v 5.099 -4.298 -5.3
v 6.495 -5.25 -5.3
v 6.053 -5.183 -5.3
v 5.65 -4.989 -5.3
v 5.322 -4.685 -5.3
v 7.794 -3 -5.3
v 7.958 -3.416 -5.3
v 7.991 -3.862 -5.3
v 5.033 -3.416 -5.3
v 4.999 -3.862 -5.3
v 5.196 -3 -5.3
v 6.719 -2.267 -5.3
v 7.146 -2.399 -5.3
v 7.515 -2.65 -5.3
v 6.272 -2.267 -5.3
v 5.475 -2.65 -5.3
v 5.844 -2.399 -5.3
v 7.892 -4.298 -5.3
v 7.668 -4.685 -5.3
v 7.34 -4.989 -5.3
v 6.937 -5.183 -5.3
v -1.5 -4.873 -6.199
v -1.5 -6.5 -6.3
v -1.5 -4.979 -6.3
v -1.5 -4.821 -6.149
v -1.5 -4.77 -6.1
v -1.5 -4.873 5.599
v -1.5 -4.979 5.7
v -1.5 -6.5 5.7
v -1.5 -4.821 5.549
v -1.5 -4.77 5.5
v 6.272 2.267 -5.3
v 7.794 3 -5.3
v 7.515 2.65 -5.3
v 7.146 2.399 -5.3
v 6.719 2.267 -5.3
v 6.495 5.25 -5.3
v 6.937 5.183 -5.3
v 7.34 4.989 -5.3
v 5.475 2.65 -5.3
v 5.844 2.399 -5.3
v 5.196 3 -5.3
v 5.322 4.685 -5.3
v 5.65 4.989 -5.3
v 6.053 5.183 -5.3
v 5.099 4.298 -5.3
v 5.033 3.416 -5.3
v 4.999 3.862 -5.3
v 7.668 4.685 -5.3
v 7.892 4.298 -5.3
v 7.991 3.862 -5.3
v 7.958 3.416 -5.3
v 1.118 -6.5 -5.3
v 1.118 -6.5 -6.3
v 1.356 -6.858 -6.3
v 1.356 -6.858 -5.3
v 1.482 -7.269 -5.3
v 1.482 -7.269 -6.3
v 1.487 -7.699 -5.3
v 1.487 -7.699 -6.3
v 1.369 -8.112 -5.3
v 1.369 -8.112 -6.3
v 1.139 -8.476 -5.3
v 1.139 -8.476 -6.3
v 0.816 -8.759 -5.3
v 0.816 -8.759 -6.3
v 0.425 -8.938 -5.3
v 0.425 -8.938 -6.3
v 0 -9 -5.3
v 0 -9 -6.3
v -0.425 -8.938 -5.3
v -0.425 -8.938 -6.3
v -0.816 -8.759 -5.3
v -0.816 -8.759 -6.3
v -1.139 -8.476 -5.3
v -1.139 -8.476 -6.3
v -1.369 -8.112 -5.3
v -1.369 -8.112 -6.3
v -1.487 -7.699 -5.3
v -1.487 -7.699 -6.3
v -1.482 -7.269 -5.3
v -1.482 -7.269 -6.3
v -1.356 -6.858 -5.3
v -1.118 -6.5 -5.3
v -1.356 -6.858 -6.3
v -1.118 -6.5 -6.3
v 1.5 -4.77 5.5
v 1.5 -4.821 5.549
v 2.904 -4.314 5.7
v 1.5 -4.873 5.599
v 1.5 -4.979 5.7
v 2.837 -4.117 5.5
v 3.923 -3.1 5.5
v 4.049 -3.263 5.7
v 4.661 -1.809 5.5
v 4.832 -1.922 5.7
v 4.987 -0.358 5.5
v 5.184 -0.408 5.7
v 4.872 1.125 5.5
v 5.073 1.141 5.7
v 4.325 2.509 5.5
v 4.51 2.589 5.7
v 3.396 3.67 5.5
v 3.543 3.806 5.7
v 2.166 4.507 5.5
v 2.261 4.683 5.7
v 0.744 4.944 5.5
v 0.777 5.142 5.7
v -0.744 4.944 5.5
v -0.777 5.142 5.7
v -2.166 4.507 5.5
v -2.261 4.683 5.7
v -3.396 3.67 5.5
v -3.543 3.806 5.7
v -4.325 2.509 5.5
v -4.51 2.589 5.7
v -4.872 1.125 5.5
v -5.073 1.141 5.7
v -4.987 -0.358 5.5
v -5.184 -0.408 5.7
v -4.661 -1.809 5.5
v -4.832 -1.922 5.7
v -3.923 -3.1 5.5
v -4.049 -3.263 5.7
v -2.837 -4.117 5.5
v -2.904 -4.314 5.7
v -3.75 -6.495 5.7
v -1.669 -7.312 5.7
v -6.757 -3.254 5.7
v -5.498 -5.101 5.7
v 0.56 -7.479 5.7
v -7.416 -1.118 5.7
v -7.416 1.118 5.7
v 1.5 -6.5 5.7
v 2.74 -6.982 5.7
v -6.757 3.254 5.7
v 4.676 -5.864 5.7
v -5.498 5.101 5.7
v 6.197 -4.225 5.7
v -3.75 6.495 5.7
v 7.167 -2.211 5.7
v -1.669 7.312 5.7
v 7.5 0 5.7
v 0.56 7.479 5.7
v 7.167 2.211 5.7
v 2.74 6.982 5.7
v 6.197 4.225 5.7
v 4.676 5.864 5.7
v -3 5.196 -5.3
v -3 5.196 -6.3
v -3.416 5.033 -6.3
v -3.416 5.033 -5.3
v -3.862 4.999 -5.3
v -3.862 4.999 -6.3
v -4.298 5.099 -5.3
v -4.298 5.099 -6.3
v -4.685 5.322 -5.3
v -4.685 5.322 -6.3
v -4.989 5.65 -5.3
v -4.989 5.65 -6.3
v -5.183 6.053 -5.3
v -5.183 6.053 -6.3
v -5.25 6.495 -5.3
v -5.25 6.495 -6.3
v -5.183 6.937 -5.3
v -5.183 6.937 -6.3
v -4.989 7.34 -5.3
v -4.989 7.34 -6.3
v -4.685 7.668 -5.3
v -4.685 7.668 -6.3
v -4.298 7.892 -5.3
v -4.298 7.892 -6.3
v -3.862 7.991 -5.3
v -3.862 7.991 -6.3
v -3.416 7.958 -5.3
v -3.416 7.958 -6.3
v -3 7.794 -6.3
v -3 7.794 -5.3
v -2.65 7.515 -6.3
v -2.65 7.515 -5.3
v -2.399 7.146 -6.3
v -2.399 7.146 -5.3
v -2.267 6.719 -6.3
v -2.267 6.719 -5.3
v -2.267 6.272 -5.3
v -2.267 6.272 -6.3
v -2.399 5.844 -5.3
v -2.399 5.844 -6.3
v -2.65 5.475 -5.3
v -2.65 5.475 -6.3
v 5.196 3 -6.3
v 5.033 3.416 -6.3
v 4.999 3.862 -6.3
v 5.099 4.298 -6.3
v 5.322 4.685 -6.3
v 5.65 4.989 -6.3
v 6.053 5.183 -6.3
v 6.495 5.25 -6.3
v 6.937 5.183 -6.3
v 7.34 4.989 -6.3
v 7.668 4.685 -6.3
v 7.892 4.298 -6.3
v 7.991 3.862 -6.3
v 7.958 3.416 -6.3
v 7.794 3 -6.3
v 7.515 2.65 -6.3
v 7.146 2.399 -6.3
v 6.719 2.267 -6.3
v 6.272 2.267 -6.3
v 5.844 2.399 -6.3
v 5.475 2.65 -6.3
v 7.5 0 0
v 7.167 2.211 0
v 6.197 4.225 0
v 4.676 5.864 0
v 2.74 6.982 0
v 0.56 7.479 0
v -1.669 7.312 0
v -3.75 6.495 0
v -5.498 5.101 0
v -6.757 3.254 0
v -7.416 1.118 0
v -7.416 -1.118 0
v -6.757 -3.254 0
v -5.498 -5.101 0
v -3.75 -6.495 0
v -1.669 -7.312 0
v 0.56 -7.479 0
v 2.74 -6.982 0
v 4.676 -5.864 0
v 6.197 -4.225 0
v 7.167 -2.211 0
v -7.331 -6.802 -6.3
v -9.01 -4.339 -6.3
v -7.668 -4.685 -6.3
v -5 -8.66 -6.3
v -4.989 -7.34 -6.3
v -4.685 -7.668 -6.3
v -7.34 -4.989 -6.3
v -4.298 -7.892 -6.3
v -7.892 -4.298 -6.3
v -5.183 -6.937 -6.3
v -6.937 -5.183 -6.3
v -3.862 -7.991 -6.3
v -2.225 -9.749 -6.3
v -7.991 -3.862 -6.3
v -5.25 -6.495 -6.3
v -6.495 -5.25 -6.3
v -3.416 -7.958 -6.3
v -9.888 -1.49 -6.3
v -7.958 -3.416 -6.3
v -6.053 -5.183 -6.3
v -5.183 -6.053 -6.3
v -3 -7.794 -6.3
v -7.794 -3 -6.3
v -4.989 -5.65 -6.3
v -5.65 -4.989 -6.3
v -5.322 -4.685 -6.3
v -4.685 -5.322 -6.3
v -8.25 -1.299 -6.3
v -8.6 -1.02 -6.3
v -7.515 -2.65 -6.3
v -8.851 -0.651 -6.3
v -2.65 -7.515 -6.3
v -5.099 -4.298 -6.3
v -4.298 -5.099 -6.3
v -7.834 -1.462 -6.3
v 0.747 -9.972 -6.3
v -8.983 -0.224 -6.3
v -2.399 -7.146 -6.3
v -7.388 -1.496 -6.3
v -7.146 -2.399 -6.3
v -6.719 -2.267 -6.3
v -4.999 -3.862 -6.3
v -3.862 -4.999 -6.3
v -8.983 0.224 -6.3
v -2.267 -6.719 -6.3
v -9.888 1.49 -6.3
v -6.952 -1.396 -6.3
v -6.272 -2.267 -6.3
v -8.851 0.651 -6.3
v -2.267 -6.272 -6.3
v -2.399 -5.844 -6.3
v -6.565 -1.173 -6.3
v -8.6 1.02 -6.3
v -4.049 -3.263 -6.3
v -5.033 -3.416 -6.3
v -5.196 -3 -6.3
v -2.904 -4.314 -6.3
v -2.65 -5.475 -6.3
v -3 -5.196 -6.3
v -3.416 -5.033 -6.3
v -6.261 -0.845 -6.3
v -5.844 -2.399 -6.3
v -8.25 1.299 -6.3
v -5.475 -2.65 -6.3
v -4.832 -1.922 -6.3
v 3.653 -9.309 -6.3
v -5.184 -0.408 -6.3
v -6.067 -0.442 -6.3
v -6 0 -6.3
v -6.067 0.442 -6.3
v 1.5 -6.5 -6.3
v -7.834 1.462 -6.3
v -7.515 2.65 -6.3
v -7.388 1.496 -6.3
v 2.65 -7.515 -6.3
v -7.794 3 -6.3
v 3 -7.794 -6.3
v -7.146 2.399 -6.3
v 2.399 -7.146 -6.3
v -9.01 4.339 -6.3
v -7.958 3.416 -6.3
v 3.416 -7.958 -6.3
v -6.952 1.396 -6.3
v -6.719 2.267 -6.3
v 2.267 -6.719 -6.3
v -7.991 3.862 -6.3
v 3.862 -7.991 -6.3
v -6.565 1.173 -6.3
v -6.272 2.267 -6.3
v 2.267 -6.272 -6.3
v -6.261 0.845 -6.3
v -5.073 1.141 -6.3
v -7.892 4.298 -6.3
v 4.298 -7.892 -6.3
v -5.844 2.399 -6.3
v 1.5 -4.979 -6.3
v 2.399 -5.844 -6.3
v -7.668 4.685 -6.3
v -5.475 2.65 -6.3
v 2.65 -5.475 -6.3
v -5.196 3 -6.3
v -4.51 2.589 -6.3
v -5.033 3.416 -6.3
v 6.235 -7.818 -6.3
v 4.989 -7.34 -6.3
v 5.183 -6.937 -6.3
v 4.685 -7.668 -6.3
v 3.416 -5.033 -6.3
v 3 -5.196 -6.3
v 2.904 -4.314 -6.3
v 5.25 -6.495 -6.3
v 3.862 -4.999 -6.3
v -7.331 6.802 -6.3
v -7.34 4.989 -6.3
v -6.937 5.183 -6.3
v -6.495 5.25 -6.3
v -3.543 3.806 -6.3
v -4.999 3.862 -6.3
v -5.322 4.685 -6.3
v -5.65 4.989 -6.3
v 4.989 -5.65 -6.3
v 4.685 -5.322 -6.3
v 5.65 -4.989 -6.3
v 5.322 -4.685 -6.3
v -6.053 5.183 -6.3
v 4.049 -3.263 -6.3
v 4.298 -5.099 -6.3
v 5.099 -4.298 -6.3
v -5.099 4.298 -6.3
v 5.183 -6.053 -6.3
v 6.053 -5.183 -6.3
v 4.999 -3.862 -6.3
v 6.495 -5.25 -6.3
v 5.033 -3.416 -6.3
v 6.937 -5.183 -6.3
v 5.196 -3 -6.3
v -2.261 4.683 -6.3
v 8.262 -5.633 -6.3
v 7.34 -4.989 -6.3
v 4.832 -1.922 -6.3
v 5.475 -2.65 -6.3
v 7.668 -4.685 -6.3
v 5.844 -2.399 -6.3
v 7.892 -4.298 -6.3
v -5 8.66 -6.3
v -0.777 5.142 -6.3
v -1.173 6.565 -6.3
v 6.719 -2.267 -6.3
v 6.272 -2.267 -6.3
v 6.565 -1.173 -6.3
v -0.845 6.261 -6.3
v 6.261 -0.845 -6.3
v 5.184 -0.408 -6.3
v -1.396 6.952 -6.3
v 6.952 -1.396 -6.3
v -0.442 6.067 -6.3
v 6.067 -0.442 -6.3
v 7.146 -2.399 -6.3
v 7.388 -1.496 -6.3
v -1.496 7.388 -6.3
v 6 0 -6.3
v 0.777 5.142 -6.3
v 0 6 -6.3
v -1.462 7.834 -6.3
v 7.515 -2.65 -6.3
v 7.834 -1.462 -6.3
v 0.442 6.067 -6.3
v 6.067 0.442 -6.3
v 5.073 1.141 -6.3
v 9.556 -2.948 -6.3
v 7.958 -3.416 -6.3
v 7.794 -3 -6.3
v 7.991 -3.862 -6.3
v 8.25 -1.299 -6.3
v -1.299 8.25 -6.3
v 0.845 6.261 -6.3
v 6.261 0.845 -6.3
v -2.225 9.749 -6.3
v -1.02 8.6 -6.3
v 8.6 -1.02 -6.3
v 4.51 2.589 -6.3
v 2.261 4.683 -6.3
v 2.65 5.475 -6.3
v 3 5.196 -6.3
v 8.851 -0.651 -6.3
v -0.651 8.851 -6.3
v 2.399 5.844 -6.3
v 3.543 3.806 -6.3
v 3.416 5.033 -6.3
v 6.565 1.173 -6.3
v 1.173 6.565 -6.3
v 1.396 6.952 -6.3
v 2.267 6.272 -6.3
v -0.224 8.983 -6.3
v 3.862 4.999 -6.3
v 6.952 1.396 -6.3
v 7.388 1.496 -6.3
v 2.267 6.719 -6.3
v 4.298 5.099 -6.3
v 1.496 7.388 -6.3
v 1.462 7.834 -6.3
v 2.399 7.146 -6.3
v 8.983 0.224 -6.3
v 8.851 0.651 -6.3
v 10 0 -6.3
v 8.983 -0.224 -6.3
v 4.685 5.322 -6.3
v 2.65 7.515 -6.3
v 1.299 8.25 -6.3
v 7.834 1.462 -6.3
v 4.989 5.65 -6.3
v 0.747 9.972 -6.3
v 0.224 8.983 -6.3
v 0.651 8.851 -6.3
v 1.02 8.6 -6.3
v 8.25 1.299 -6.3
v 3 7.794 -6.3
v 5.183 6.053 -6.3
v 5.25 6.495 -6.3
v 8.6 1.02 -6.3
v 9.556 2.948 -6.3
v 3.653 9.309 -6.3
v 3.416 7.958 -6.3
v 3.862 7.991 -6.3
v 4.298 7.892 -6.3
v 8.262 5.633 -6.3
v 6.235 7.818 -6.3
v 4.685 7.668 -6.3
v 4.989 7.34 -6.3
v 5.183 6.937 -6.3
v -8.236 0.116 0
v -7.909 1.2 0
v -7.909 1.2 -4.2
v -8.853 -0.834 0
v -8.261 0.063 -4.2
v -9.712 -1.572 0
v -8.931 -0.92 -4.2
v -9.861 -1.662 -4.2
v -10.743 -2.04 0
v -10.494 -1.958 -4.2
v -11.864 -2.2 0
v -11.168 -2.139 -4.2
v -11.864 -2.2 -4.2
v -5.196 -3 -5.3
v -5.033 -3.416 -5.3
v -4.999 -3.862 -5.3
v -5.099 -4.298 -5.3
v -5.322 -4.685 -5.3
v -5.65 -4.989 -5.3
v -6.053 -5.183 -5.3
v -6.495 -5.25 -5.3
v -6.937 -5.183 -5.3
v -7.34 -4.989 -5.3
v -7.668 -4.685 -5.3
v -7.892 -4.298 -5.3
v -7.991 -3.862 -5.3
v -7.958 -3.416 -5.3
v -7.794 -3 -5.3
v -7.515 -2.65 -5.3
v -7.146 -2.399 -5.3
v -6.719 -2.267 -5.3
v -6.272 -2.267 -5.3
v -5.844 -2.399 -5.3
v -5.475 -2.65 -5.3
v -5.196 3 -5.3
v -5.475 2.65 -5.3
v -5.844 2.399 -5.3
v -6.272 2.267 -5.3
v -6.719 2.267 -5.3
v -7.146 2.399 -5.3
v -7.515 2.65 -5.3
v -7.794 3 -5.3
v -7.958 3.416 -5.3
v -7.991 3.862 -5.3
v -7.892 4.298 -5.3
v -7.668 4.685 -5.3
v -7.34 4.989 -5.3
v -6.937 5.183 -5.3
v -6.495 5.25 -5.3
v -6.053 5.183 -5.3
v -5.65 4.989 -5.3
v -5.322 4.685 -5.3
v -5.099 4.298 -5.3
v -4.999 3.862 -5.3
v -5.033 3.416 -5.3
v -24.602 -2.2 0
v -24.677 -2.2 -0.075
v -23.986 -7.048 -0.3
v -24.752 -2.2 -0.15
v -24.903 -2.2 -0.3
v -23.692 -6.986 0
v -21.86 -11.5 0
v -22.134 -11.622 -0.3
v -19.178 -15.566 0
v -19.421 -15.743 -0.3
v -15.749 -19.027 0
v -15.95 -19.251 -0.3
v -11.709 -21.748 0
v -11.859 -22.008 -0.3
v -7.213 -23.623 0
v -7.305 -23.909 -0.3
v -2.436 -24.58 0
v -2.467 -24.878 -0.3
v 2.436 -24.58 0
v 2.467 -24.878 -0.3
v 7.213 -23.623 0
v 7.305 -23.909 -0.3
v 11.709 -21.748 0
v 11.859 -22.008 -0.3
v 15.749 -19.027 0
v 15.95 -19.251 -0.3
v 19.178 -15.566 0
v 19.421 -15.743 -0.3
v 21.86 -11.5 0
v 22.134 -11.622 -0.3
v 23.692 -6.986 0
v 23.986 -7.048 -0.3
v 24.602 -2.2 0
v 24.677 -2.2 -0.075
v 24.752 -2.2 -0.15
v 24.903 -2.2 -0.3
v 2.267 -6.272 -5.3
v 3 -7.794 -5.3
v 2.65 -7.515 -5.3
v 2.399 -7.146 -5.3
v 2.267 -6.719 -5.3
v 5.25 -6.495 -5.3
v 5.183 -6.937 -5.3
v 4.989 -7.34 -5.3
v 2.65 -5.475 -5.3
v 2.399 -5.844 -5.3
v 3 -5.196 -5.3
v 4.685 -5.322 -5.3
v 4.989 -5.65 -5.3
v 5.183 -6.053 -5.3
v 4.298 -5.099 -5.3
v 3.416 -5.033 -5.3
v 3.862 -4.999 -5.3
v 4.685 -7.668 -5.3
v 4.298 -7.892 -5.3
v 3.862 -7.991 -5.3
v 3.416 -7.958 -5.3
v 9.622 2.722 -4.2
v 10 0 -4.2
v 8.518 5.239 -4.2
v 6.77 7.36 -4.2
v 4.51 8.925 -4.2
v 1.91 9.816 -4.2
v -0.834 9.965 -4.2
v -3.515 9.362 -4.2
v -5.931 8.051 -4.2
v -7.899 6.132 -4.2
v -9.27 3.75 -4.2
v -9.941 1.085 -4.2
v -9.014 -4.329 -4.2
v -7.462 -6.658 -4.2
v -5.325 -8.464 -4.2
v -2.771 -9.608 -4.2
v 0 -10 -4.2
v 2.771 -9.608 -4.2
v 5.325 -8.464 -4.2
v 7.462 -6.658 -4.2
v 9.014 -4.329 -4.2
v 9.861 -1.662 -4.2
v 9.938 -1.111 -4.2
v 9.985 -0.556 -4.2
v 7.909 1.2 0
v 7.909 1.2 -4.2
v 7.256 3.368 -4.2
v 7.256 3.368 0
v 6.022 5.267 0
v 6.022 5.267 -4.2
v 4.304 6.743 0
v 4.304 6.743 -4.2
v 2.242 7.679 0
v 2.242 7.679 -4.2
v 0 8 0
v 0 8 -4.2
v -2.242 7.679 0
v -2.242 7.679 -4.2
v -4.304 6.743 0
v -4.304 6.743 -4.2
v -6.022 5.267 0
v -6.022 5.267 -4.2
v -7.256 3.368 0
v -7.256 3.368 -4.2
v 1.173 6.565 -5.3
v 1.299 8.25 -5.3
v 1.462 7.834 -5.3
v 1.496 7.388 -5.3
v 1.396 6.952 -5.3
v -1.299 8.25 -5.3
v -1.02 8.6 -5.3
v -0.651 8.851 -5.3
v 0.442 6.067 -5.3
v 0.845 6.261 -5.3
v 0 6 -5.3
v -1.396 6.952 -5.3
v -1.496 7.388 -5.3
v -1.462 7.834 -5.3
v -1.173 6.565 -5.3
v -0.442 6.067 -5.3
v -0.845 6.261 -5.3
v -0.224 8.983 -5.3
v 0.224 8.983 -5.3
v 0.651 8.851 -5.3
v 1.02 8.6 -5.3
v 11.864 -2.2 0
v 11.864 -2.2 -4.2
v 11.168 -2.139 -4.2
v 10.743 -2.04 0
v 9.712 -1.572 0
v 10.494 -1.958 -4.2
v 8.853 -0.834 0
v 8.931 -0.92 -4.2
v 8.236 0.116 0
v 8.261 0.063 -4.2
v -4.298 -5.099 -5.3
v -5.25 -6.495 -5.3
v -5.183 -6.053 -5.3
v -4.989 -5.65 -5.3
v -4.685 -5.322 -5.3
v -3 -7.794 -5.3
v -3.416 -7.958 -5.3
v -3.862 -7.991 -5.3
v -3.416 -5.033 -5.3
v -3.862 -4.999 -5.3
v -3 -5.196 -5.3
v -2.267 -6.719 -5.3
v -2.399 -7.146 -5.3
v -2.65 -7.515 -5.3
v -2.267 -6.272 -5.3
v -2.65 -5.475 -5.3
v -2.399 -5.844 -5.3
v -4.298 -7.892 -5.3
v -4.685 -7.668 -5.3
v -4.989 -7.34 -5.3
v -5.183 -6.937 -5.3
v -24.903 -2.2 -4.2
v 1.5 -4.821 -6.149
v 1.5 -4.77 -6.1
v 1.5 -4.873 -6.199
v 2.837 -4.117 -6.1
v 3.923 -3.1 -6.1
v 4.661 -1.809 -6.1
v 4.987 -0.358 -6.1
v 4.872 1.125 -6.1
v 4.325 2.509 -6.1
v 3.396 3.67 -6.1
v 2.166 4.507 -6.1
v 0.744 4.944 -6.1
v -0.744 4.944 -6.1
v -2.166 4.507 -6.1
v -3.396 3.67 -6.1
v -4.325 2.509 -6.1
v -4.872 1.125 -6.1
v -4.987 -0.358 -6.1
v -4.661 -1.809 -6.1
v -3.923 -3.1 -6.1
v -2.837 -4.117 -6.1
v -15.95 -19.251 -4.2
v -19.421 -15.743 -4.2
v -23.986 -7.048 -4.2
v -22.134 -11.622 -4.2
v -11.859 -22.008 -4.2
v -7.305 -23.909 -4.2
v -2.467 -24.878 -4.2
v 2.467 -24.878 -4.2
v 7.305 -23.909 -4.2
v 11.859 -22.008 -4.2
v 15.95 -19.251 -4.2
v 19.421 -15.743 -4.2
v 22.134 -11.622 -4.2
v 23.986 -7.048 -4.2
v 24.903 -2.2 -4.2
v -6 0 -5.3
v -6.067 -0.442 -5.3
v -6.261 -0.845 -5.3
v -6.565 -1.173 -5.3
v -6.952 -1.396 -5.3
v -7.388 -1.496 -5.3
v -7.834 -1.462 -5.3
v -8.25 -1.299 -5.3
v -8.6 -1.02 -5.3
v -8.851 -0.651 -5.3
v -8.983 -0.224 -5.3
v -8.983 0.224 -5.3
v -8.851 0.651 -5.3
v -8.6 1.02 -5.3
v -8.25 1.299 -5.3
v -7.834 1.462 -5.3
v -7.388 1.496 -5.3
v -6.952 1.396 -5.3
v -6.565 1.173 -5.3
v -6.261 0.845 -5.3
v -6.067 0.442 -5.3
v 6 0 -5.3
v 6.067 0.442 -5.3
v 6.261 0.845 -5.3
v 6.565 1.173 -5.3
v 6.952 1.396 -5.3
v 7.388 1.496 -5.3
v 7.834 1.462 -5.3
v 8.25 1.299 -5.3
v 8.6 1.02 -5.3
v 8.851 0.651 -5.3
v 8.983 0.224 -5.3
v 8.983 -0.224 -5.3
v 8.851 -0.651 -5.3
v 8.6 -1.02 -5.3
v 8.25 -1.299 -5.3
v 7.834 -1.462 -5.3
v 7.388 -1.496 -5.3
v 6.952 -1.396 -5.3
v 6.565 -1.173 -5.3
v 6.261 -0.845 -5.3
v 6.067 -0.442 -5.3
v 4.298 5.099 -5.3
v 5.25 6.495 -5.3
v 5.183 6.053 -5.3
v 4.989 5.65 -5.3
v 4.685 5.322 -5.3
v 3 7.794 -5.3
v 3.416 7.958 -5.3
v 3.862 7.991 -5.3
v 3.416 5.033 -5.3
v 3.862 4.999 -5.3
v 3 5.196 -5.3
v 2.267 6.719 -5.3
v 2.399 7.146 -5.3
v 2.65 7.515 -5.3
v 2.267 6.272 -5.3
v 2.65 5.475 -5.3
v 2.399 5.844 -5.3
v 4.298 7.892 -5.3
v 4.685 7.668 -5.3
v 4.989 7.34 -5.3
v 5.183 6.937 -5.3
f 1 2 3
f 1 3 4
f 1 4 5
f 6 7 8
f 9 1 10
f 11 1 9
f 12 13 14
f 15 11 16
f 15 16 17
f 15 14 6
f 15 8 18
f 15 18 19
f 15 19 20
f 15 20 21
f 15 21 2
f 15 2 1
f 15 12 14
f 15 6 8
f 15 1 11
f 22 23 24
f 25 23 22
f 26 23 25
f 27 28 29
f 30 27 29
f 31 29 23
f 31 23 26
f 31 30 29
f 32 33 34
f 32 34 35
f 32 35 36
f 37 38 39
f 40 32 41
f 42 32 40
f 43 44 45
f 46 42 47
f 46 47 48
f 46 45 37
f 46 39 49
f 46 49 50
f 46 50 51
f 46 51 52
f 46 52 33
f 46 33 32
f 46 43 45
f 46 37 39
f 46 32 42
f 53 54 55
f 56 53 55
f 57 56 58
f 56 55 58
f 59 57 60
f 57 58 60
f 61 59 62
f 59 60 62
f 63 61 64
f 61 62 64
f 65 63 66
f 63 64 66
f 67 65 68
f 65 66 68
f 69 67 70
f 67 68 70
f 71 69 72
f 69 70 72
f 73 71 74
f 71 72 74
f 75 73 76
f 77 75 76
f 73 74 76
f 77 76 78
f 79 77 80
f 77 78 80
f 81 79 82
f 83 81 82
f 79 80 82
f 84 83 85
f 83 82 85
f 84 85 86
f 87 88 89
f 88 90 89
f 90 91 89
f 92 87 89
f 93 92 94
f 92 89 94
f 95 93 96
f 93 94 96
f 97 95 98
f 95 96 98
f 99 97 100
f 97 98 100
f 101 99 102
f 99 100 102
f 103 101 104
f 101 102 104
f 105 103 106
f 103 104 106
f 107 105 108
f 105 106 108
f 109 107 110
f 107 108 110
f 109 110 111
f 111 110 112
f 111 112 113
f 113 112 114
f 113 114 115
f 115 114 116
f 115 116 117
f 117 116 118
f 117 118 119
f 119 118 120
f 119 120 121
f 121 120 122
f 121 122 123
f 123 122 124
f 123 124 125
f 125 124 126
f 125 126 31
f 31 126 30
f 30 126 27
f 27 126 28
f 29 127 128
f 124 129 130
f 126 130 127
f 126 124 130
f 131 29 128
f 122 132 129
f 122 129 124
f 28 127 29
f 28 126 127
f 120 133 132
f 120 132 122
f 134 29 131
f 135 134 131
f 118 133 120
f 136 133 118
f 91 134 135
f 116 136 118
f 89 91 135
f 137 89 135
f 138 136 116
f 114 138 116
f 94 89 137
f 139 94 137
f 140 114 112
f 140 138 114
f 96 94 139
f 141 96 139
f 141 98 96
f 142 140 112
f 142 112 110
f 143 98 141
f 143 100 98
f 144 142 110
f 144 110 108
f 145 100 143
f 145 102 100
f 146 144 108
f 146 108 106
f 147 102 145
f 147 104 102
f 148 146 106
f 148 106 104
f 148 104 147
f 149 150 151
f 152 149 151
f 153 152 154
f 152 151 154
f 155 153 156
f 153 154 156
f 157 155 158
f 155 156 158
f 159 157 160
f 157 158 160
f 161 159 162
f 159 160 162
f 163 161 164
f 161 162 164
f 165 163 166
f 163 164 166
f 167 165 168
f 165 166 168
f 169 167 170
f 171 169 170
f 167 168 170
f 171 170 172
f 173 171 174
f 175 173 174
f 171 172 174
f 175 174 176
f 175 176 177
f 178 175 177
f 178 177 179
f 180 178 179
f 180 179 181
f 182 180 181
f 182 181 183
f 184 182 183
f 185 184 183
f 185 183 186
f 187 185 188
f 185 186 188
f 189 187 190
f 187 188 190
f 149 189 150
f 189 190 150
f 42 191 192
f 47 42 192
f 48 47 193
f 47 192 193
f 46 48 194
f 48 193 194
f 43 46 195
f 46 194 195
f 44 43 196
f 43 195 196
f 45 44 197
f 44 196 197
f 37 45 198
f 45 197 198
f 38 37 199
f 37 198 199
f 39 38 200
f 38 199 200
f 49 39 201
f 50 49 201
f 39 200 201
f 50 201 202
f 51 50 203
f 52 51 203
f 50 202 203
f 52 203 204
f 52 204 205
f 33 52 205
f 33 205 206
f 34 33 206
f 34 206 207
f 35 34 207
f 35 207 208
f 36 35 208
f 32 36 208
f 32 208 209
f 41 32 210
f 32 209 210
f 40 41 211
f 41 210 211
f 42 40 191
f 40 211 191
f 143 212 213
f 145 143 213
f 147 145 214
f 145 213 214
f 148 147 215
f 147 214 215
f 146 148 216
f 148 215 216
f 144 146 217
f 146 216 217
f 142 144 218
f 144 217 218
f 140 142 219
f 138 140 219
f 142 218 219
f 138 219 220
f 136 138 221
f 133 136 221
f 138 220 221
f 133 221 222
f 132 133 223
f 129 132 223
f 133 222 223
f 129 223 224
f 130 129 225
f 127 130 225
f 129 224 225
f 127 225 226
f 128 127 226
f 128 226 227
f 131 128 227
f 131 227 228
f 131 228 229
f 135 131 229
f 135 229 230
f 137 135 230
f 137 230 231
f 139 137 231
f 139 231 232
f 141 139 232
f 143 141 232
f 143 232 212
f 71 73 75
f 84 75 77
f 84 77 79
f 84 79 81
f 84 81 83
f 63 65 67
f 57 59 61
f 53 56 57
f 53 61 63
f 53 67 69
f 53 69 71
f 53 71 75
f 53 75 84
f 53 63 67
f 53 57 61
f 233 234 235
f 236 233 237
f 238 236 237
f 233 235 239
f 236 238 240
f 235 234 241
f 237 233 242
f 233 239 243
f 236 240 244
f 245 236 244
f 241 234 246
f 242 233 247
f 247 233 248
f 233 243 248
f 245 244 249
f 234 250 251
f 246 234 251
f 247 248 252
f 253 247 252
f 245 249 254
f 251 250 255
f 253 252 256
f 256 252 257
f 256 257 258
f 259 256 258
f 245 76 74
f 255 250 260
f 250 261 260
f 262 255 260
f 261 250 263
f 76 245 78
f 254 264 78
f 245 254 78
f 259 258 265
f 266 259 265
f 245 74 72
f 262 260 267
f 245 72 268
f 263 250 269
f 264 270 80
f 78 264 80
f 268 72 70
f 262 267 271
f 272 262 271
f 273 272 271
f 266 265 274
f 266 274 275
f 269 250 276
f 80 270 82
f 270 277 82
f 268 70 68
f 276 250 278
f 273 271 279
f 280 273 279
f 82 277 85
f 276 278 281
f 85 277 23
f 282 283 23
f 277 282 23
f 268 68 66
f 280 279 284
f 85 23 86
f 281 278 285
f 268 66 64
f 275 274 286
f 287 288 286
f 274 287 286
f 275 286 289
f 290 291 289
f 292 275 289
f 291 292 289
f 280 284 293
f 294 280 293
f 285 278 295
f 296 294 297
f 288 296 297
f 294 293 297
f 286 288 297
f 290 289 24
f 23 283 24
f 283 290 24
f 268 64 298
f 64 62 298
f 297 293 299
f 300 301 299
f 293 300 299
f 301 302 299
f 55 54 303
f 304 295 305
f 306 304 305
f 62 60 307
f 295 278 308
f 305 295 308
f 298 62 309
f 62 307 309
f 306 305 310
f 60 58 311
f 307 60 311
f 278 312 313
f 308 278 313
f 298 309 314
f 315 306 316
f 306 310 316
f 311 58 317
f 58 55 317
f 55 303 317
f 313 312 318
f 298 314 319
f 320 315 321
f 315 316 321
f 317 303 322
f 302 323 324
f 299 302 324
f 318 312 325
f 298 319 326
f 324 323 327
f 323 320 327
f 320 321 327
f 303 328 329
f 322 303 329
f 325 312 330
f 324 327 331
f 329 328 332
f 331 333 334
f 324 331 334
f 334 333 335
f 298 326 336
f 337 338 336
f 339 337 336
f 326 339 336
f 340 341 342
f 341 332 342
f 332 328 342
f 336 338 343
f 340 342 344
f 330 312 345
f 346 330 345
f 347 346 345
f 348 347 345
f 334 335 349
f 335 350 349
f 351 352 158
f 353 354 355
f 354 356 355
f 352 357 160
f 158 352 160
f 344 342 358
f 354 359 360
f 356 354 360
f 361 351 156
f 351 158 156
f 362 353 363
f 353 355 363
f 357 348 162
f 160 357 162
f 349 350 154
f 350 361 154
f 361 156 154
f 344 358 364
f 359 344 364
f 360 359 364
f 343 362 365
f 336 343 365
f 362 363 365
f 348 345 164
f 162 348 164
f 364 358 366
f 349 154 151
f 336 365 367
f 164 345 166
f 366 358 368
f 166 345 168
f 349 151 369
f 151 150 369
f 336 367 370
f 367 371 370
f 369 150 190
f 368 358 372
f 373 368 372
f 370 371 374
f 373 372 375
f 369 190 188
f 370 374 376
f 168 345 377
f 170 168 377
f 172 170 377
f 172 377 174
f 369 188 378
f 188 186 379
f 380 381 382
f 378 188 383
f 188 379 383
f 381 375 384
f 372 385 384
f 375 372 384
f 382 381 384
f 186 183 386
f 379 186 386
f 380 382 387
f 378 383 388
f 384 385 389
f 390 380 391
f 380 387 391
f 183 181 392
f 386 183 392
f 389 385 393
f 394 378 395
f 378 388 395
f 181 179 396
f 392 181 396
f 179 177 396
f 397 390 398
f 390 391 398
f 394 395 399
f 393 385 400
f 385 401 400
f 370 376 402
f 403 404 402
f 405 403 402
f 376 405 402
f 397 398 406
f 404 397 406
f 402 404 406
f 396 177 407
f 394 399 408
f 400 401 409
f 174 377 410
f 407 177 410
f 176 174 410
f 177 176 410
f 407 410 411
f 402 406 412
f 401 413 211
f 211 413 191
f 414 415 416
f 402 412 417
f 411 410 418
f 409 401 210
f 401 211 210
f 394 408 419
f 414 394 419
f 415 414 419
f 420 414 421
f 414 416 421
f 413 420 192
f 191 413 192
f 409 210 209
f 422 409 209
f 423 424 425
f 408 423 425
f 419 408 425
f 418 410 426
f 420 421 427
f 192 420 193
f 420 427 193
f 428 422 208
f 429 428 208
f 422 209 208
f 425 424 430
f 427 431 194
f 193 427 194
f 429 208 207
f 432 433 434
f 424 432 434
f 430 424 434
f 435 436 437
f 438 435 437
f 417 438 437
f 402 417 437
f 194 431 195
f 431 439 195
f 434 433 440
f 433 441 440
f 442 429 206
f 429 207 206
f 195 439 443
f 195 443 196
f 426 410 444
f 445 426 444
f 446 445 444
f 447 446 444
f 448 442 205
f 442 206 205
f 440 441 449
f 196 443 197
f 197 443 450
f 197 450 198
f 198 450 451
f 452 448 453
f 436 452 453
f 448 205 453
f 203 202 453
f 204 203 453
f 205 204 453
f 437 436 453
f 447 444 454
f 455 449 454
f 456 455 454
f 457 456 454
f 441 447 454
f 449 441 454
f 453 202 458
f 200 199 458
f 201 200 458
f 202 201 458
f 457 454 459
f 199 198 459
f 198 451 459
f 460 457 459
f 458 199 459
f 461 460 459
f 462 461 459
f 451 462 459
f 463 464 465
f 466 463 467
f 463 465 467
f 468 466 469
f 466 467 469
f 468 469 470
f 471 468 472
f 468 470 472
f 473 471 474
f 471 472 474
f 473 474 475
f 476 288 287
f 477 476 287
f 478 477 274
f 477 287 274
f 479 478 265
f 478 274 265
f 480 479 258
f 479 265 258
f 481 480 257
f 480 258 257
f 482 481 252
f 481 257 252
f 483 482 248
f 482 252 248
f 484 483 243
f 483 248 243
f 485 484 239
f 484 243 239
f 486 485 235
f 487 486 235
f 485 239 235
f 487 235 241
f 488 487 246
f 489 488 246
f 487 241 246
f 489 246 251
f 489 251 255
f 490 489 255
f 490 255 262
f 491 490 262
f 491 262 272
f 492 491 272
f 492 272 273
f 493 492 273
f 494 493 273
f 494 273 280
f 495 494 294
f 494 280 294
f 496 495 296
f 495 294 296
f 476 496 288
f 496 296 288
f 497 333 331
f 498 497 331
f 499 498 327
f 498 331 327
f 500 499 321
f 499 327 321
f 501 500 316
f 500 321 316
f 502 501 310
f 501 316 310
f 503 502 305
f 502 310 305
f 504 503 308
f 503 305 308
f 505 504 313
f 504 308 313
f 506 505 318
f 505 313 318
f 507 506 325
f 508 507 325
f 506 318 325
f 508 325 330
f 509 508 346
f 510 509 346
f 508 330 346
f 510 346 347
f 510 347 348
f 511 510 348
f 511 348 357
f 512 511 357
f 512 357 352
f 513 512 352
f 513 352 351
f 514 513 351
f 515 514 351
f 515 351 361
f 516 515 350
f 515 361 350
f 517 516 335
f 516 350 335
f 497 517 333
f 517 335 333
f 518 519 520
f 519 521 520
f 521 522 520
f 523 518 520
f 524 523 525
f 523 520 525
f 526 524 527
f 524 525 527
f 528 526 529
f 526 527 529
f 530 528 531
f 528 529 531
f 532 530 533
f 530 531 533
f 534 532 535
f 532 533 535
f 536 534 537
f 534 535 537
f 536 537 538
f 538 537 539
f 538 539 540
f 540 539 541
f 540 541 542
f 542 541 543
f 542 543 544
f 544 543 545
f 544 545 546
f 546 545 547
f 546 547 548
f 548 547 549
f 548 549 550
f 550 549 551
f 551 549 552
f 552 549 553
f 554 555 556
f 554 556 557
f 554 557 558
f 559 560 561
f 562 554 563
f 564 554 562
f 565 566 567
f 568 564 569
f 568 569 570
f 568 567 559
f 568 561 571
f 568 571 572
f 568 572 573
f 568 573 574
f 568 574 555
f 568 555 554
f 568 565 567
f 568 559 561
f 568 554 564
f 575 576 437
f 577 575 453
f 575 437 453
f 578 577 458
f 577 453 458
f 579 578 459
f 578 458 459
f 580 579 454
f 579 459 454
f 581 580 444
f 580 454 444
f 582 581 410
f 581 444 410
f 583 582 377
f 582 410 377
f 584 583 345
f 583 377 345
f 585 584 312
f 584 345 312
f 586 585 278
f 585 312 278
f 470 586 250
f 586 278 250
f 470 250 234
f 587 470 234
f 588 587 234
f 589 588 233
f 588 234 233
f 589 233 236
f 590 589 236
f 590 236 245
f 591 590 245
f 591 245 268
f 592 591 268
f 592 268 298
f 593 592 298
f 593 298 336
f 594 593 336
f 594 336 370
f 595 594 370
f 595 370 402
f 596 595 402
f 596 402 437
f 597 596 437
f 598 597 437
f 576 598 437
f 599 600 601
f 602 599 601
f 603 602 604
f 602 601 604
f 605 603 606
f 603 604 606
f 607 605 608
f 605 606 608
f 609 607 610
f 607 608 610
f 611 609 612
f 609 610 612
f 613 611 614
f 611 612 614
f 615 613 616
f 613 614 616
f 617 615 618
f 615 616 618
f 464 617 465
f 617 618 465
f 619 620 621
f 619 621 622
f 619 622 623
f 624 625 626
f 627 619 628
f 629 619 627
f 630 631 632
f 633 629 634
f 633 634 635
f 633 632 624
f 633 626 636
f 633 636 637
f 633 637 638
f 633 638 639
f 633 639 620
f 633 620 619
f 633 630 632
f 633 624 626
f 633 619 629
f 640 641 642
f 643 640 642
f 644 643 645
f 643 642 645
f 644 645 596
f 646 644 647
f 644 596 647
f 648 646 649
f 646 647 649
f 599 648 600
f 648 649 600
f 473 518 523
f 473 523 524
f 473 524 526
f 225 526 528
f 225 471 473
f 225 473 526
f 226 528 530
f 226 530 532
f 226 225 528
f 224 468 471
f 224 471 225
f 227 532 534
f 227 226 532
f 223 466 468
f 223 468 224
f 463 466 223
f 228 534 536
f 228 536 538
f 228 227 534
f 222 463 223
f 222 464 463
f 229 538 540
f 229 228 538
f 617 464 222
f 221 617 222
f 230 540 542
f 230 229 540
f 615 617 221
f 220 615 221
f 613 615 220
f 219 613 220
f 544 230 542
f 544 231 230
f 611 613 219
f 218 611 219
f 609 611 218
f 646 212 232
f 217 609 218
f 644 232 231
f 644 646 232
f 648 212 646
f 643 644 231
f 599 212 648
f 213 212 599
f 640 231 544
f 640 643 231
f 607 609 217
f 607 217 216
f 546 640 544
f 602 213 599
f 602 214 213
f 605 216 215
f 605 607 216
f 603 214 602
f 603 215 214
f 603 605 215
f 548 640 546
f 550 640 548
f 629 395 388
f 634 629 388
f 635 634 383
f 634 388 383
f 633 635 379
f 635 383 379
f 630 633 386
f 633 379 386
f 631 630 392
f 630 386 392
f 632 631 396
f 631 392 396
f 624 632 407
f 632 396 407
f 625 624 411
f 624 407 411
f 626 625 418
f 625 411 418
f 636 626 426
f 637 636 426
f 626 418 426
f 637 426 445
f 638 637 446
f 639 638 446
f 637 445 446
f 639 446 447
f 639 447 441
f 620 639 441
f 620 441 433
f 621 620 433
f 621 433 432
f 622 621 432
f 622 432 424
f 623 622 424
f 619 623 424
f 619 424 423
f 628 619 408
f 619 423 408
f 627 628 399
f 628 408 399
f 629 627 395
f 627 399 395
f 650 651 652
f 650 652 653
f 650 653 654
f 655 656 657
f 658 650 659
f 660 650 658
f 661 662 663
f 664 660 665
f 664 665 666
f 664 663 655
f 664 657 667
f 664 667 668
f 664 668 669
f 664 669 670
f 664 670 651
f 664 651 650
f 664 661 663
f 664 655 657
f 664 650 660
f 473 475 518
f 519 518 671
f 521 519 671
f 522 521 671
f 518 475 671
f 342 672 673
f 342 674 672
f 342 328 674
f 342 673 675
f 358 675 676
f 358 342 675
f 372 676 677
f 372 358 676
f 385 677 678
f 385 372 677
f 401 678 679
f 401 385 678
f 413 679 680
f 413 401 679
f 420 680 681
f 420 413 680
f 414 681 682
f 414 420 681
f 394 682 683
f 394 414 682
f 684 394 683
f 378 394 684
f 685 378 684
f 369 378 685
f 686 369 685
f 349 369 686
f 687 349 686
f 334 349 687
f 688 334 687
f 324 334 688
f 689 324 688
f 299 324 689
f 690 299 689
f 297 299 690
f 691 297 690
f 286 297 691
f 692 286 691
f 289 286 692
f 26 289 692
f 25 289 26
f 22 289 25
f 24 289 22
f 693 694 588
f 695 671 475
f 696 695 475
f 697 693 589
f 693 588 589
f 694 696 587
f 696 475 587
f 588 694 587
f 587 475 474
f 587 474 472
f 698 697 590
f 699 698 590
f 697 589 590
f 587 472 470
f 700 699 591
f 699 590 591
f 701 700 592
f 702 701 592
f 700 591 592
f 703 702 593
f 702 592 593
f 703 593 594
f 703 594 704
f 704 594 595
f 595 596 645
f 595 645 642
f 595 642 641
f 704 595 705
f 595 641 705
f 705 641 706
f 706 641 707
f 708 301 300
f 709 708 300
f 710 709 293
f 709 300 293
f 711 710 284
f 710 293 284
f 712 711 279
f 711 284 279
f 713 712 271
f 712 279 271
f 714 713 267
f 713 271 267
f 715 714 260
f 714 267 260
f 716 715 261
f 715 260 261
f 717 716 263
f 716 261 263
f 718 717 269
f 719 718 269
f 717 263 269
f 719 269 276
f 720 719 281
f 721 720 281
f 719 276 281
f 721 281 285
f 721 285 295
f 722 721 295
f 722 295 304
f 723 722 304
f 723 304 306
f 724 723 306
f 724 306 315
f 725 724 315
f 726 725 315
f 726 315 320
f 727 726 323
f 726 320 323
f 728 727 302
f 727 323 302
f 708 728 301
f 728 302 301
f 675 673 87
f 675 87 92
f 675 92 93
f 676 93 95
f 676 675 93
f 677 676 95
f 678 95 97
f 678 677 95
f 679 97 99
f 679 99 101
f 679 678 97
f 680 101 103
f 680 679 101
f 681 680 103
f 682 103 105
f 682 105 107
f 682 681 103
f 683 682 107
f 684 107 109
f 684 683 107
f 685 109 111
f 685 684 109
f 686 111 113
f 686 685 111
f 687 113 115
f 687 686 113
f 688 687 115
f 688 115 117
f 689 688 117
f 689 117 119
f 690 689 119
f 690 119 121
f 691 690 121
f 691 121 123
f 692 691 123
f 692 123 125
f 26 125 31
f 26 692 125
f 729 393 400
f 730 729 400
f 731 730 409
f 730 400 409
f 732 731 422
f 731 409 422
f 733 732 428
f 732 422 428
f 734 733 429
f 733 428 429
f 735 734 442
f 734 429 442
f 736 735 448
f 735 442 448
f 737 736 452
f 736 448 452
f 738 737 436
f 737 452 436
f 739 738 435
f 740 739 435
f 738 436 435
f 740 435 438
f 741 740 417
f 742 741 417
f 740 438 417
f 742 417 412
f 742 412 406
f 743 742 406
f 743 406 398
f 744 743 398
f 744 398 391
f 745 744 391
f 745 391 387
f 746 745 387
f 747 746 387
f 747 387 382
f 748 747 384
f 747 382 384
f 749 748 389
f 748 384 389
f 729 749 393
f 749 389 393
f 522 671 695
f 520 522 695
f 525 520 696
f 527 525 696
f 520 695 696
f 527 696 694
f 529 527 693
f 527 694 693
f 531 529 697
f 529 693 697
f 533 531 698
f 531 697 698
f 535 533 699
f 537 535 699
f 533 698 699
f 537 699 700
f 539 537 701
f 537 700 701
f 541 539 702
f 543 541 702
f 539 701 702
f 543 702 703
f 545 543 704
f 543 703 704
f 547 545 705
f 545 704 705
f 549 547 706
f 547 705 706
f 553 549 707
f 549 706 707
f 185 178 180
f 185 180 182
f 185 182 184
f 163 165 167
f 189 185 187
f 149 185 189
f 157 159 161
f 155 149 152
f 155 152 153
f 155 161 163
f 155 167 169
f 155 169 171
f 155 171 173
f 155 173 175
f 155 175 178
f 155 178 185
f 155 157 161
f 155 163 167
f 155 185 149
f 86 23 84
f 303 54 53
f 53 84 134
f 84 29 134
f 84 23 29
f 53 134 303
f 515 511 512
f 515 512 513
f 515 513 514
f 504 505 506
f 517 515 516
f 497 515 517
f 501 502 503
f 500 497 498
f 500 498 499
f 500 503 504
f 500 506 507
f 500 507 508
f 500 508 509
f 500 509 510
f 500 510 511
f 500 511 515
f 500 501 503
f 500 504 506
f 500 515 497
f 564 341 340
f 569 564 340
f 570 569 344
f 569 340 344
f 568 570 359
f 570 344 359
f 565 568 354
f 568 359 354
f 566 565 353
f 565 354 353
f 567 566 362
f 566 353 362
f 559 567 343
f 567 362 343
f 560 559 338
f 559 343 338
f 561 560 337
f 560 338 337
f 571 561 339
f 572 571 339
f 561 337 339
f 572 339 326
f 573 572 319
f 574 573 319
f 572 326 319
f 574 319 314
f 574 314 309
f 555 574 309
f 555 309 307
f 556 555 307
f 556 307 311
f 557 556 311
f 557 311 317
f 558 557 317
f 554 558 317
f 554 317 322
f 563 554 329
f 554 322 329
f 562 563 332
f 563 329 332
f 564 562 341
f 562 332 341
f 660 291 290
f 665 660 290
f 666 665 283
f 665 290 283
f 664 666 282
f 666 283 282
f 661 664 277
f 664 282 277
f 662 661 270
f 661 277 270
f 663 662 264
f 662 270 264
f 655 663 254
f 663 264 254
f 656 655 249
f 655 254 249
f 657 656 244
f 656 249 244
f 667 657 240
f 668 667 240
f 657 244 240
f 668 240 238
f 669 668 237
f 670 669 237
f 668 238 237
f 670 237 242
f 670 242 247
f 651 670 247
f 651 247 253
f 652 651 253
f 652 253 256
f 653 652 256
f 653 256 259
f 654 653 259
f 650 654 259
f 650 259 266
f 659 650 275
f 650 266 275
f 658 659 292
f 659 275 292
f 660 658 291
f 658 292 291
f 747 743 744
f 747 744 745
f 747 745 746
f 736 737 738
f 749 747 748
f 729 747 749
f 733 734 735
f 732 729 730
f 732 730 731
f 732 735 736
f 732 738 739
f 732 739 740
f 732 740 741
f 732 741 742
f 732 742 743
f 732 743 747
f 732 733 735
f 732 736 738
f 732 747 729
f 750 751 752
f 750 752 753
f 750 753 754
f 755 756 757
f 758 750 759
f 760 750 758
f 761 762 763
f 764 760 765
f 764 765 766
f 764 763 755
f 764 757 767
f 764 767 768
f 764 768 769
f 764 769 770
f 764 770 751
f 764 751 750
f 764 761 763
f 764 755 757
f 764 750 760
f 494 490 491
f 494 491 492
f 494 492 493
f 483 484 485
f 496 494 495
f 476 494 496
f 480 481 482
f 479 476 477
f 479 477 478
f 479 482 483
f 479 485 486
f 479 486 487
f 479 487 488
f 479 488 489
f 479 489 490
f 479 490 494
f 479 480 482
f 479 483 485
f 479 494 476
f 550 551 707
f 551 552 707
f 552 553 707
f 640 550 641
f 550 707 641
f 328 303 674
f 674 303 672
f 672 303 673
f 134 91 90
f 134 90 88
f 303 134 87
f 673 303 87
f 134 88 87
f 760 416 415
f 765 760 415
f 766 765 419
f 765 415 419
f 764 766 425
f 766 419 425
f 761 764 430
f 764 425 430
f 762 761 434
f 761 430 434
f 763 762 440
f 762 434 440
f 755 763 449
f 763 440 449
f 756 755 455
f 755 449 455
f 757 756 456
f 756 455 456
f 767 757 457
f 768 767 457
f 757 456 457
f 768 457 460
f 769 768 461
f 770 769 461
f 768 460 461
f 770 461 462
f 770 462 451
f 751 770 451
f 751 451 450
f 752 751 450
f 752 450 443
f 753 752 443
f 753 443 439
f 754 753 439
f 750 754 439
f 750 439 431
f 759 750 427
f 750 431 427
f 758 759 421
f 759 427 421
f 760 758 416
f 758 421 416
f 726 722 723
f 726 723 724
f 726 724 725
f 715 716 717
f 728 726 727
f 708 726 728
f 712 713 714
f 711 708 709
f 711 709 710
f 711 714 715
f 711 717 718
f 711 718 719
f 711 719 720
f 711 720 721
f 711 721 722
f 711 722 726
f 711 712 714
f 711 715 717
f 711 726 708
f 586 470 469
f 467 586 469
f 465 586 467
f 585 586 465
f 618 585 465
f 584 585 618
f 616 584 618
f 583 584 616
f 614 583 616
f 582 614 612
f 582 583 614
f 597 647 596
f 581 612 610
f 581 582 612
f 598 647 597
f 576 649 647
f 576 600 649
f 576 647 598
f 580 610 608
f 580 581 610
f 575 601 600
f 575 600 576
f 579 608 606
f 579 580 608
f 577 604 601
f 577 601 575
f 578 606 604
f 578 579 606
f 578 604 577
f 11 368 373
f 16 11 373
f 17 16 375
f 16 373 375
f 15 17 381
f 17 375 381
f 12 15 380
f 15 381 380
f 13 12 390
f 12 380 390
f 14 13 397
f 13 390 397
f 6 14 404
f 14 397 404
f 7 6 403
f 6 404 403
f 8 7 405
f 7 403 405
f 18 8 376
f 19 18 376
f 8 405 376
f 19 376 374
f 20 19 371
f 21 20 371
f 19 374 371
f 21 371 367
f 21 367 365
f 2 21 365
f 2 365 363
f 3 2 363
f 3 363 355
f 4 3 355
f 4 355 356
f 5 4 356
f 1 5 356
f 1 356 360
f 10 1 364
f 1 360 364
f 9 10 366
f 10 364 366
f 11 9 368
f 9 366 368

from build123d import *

# Parameters (mm, degrees)
JOIN1_START         = -4.2
JOIN1_OUTLINE_R     = 5
JOIN1_DEPTH         = 4.2
JOIN1_START_2       = -6.3
JOIN1_2_OUTLINE_R   = 7.5
JOIN1_2_OUTLINE_R_2 = 5
JOIN1_2_DEPTH       = 12
JOIN1_3_OUTLINE_R   = 10
JOIN1_3_OUTLINE_R_2 = 7.5
JOIN1_3_DEPTH       = 2.1
SKETCH1_W           = 3
SKETCH1_H           = 4.738081577
CUT_EXTRUDE1_DEPTH  = 38.271436785
SKETCH2_R           = 1.5
CUT_EXTRUDE2_DEPTH  = 1
CIRPATTERN1_COUNT   = 12
CHAMFER1_SIZE       = 0.2
CHAMFER2_SIZE       = 0.2
CHAMFER3_SIZE       = 0.3


# Read off the part's stored shape, not the designer's step: Join1
with BuildPart() as part:
    # Join1 outline → Join1 (new body)
    with BuildSketch(Plane.XY.offset(JOIN1_START)):
        with BuildLine():
            ThreePointArc((-24.903011866, -2.2), (0, -25), (24.903011866, -2.2))
            Line((24.903011866, -2.2), (11.86423196, -2.2))
            ThreePointArc((11.86423196, -2.2), (9.256550998, -1.233150178), (7.909487973, 1.2))
            ThreePointArc((7.909487973, 1.2), (0, 8), (-7.909487973, 1.2))
            ThreePointArc((-7.909487973, 1.2), (-9.256550998, -1.233150178), (-11.86423196, -2.2))
            Line((-11.86423196, -2.2), (-24.903011866, -2.2))
        make_face()
        Circle(JOIN1_OUTLINE_R, mode=Mode.SUBTRACT)
    extrude(amount=JOIN1_DEPTH)

    # Join1 2 outline → Join1 2 (add)
    with BuildSketch(Plane.XY.offset(JOIN1_START_2)):
        Circle(JOIN1_2_OUTLINE_R)
        Circle(JOIN1_2_OUTLINE_R_2, mode=Mode.SUBTRACT)
    extrude(amount=JOIN1_2_DEPTH)

    # Join1 3 outline → Join1 3 (add)
    with BuildSketch(Plane.XY.offset(JOIN1_START_2)):
        Circle(JOIN1_3_OUTLINE_R)
        Circle(JOIN1_3_OUTLINE_R_2, mode=Mode.SUBTRACT)
    extrude(amount=JOIN1_3_DEPTH)

    # Sketch1 → Cut-Extrude1 (cut, through all)
    with BuildSketch(Plane.XY.offset(5.7)):
        with Locations((0, -4.130959212)):
            Rectangle(SKETCH1_W, SKETCH1_H)
    extrude(amount=-CUT_EXTRUDE1_DEPTH, mode=Mode.SUBTRACT)

    # Sketch2 → Cut-Extrude2 (cut)
    with BuildSketch(Plane(origin=(0, 0, -6.3), x_dir=(-1, 0, 0), z_dir=(0, 0, -1))):
        with Locations((-7.5, 0)):
            Circle(SKETCH2_R)
    cut_extrude2 = extrude(amount=-CUT_EXTRUDE2_DEPTH, mode=Mode.SUBTRACT)

    # CirPattern1: Cut-Extrude2 ×12 about axis
    cirpattern1_axis = Axis((0, 0, 0), (0, 0, 1))
    for i in range(1, CIRPATTERN1_COUNT):
        add(cut_extrude2.rotate(cirpattern1_axis, i * 360 / CIRPATTERN1_COUNT), mode=Mode.SUBTRACT)

    # Chamfer1
    chamfer1_edges = [part.edges().sort_by_distance(p)[0] for p in [
        (0, 5, 5.7),
    ]]
    chamfer(chamfer1_edges, length=CHAMFER1_SIZE)

    # Chamfer2
    chamfer2_edges = [part.edges().sort_by_distance(p)[0] for p in [
        (0, 5, -6.3),
    ]]
    chamfer(chamfer2_edges, length=CHAMFER2_SIZE)

    # Chamfer3
    chamfer3_edges = [part.edges().sort_by_distance(p)[0] for p in [
        (0, -25, 0),
    ]]
    chamfer(chamfer3_edges, length=CHAMFER3_SIZE)


solid = part.part
